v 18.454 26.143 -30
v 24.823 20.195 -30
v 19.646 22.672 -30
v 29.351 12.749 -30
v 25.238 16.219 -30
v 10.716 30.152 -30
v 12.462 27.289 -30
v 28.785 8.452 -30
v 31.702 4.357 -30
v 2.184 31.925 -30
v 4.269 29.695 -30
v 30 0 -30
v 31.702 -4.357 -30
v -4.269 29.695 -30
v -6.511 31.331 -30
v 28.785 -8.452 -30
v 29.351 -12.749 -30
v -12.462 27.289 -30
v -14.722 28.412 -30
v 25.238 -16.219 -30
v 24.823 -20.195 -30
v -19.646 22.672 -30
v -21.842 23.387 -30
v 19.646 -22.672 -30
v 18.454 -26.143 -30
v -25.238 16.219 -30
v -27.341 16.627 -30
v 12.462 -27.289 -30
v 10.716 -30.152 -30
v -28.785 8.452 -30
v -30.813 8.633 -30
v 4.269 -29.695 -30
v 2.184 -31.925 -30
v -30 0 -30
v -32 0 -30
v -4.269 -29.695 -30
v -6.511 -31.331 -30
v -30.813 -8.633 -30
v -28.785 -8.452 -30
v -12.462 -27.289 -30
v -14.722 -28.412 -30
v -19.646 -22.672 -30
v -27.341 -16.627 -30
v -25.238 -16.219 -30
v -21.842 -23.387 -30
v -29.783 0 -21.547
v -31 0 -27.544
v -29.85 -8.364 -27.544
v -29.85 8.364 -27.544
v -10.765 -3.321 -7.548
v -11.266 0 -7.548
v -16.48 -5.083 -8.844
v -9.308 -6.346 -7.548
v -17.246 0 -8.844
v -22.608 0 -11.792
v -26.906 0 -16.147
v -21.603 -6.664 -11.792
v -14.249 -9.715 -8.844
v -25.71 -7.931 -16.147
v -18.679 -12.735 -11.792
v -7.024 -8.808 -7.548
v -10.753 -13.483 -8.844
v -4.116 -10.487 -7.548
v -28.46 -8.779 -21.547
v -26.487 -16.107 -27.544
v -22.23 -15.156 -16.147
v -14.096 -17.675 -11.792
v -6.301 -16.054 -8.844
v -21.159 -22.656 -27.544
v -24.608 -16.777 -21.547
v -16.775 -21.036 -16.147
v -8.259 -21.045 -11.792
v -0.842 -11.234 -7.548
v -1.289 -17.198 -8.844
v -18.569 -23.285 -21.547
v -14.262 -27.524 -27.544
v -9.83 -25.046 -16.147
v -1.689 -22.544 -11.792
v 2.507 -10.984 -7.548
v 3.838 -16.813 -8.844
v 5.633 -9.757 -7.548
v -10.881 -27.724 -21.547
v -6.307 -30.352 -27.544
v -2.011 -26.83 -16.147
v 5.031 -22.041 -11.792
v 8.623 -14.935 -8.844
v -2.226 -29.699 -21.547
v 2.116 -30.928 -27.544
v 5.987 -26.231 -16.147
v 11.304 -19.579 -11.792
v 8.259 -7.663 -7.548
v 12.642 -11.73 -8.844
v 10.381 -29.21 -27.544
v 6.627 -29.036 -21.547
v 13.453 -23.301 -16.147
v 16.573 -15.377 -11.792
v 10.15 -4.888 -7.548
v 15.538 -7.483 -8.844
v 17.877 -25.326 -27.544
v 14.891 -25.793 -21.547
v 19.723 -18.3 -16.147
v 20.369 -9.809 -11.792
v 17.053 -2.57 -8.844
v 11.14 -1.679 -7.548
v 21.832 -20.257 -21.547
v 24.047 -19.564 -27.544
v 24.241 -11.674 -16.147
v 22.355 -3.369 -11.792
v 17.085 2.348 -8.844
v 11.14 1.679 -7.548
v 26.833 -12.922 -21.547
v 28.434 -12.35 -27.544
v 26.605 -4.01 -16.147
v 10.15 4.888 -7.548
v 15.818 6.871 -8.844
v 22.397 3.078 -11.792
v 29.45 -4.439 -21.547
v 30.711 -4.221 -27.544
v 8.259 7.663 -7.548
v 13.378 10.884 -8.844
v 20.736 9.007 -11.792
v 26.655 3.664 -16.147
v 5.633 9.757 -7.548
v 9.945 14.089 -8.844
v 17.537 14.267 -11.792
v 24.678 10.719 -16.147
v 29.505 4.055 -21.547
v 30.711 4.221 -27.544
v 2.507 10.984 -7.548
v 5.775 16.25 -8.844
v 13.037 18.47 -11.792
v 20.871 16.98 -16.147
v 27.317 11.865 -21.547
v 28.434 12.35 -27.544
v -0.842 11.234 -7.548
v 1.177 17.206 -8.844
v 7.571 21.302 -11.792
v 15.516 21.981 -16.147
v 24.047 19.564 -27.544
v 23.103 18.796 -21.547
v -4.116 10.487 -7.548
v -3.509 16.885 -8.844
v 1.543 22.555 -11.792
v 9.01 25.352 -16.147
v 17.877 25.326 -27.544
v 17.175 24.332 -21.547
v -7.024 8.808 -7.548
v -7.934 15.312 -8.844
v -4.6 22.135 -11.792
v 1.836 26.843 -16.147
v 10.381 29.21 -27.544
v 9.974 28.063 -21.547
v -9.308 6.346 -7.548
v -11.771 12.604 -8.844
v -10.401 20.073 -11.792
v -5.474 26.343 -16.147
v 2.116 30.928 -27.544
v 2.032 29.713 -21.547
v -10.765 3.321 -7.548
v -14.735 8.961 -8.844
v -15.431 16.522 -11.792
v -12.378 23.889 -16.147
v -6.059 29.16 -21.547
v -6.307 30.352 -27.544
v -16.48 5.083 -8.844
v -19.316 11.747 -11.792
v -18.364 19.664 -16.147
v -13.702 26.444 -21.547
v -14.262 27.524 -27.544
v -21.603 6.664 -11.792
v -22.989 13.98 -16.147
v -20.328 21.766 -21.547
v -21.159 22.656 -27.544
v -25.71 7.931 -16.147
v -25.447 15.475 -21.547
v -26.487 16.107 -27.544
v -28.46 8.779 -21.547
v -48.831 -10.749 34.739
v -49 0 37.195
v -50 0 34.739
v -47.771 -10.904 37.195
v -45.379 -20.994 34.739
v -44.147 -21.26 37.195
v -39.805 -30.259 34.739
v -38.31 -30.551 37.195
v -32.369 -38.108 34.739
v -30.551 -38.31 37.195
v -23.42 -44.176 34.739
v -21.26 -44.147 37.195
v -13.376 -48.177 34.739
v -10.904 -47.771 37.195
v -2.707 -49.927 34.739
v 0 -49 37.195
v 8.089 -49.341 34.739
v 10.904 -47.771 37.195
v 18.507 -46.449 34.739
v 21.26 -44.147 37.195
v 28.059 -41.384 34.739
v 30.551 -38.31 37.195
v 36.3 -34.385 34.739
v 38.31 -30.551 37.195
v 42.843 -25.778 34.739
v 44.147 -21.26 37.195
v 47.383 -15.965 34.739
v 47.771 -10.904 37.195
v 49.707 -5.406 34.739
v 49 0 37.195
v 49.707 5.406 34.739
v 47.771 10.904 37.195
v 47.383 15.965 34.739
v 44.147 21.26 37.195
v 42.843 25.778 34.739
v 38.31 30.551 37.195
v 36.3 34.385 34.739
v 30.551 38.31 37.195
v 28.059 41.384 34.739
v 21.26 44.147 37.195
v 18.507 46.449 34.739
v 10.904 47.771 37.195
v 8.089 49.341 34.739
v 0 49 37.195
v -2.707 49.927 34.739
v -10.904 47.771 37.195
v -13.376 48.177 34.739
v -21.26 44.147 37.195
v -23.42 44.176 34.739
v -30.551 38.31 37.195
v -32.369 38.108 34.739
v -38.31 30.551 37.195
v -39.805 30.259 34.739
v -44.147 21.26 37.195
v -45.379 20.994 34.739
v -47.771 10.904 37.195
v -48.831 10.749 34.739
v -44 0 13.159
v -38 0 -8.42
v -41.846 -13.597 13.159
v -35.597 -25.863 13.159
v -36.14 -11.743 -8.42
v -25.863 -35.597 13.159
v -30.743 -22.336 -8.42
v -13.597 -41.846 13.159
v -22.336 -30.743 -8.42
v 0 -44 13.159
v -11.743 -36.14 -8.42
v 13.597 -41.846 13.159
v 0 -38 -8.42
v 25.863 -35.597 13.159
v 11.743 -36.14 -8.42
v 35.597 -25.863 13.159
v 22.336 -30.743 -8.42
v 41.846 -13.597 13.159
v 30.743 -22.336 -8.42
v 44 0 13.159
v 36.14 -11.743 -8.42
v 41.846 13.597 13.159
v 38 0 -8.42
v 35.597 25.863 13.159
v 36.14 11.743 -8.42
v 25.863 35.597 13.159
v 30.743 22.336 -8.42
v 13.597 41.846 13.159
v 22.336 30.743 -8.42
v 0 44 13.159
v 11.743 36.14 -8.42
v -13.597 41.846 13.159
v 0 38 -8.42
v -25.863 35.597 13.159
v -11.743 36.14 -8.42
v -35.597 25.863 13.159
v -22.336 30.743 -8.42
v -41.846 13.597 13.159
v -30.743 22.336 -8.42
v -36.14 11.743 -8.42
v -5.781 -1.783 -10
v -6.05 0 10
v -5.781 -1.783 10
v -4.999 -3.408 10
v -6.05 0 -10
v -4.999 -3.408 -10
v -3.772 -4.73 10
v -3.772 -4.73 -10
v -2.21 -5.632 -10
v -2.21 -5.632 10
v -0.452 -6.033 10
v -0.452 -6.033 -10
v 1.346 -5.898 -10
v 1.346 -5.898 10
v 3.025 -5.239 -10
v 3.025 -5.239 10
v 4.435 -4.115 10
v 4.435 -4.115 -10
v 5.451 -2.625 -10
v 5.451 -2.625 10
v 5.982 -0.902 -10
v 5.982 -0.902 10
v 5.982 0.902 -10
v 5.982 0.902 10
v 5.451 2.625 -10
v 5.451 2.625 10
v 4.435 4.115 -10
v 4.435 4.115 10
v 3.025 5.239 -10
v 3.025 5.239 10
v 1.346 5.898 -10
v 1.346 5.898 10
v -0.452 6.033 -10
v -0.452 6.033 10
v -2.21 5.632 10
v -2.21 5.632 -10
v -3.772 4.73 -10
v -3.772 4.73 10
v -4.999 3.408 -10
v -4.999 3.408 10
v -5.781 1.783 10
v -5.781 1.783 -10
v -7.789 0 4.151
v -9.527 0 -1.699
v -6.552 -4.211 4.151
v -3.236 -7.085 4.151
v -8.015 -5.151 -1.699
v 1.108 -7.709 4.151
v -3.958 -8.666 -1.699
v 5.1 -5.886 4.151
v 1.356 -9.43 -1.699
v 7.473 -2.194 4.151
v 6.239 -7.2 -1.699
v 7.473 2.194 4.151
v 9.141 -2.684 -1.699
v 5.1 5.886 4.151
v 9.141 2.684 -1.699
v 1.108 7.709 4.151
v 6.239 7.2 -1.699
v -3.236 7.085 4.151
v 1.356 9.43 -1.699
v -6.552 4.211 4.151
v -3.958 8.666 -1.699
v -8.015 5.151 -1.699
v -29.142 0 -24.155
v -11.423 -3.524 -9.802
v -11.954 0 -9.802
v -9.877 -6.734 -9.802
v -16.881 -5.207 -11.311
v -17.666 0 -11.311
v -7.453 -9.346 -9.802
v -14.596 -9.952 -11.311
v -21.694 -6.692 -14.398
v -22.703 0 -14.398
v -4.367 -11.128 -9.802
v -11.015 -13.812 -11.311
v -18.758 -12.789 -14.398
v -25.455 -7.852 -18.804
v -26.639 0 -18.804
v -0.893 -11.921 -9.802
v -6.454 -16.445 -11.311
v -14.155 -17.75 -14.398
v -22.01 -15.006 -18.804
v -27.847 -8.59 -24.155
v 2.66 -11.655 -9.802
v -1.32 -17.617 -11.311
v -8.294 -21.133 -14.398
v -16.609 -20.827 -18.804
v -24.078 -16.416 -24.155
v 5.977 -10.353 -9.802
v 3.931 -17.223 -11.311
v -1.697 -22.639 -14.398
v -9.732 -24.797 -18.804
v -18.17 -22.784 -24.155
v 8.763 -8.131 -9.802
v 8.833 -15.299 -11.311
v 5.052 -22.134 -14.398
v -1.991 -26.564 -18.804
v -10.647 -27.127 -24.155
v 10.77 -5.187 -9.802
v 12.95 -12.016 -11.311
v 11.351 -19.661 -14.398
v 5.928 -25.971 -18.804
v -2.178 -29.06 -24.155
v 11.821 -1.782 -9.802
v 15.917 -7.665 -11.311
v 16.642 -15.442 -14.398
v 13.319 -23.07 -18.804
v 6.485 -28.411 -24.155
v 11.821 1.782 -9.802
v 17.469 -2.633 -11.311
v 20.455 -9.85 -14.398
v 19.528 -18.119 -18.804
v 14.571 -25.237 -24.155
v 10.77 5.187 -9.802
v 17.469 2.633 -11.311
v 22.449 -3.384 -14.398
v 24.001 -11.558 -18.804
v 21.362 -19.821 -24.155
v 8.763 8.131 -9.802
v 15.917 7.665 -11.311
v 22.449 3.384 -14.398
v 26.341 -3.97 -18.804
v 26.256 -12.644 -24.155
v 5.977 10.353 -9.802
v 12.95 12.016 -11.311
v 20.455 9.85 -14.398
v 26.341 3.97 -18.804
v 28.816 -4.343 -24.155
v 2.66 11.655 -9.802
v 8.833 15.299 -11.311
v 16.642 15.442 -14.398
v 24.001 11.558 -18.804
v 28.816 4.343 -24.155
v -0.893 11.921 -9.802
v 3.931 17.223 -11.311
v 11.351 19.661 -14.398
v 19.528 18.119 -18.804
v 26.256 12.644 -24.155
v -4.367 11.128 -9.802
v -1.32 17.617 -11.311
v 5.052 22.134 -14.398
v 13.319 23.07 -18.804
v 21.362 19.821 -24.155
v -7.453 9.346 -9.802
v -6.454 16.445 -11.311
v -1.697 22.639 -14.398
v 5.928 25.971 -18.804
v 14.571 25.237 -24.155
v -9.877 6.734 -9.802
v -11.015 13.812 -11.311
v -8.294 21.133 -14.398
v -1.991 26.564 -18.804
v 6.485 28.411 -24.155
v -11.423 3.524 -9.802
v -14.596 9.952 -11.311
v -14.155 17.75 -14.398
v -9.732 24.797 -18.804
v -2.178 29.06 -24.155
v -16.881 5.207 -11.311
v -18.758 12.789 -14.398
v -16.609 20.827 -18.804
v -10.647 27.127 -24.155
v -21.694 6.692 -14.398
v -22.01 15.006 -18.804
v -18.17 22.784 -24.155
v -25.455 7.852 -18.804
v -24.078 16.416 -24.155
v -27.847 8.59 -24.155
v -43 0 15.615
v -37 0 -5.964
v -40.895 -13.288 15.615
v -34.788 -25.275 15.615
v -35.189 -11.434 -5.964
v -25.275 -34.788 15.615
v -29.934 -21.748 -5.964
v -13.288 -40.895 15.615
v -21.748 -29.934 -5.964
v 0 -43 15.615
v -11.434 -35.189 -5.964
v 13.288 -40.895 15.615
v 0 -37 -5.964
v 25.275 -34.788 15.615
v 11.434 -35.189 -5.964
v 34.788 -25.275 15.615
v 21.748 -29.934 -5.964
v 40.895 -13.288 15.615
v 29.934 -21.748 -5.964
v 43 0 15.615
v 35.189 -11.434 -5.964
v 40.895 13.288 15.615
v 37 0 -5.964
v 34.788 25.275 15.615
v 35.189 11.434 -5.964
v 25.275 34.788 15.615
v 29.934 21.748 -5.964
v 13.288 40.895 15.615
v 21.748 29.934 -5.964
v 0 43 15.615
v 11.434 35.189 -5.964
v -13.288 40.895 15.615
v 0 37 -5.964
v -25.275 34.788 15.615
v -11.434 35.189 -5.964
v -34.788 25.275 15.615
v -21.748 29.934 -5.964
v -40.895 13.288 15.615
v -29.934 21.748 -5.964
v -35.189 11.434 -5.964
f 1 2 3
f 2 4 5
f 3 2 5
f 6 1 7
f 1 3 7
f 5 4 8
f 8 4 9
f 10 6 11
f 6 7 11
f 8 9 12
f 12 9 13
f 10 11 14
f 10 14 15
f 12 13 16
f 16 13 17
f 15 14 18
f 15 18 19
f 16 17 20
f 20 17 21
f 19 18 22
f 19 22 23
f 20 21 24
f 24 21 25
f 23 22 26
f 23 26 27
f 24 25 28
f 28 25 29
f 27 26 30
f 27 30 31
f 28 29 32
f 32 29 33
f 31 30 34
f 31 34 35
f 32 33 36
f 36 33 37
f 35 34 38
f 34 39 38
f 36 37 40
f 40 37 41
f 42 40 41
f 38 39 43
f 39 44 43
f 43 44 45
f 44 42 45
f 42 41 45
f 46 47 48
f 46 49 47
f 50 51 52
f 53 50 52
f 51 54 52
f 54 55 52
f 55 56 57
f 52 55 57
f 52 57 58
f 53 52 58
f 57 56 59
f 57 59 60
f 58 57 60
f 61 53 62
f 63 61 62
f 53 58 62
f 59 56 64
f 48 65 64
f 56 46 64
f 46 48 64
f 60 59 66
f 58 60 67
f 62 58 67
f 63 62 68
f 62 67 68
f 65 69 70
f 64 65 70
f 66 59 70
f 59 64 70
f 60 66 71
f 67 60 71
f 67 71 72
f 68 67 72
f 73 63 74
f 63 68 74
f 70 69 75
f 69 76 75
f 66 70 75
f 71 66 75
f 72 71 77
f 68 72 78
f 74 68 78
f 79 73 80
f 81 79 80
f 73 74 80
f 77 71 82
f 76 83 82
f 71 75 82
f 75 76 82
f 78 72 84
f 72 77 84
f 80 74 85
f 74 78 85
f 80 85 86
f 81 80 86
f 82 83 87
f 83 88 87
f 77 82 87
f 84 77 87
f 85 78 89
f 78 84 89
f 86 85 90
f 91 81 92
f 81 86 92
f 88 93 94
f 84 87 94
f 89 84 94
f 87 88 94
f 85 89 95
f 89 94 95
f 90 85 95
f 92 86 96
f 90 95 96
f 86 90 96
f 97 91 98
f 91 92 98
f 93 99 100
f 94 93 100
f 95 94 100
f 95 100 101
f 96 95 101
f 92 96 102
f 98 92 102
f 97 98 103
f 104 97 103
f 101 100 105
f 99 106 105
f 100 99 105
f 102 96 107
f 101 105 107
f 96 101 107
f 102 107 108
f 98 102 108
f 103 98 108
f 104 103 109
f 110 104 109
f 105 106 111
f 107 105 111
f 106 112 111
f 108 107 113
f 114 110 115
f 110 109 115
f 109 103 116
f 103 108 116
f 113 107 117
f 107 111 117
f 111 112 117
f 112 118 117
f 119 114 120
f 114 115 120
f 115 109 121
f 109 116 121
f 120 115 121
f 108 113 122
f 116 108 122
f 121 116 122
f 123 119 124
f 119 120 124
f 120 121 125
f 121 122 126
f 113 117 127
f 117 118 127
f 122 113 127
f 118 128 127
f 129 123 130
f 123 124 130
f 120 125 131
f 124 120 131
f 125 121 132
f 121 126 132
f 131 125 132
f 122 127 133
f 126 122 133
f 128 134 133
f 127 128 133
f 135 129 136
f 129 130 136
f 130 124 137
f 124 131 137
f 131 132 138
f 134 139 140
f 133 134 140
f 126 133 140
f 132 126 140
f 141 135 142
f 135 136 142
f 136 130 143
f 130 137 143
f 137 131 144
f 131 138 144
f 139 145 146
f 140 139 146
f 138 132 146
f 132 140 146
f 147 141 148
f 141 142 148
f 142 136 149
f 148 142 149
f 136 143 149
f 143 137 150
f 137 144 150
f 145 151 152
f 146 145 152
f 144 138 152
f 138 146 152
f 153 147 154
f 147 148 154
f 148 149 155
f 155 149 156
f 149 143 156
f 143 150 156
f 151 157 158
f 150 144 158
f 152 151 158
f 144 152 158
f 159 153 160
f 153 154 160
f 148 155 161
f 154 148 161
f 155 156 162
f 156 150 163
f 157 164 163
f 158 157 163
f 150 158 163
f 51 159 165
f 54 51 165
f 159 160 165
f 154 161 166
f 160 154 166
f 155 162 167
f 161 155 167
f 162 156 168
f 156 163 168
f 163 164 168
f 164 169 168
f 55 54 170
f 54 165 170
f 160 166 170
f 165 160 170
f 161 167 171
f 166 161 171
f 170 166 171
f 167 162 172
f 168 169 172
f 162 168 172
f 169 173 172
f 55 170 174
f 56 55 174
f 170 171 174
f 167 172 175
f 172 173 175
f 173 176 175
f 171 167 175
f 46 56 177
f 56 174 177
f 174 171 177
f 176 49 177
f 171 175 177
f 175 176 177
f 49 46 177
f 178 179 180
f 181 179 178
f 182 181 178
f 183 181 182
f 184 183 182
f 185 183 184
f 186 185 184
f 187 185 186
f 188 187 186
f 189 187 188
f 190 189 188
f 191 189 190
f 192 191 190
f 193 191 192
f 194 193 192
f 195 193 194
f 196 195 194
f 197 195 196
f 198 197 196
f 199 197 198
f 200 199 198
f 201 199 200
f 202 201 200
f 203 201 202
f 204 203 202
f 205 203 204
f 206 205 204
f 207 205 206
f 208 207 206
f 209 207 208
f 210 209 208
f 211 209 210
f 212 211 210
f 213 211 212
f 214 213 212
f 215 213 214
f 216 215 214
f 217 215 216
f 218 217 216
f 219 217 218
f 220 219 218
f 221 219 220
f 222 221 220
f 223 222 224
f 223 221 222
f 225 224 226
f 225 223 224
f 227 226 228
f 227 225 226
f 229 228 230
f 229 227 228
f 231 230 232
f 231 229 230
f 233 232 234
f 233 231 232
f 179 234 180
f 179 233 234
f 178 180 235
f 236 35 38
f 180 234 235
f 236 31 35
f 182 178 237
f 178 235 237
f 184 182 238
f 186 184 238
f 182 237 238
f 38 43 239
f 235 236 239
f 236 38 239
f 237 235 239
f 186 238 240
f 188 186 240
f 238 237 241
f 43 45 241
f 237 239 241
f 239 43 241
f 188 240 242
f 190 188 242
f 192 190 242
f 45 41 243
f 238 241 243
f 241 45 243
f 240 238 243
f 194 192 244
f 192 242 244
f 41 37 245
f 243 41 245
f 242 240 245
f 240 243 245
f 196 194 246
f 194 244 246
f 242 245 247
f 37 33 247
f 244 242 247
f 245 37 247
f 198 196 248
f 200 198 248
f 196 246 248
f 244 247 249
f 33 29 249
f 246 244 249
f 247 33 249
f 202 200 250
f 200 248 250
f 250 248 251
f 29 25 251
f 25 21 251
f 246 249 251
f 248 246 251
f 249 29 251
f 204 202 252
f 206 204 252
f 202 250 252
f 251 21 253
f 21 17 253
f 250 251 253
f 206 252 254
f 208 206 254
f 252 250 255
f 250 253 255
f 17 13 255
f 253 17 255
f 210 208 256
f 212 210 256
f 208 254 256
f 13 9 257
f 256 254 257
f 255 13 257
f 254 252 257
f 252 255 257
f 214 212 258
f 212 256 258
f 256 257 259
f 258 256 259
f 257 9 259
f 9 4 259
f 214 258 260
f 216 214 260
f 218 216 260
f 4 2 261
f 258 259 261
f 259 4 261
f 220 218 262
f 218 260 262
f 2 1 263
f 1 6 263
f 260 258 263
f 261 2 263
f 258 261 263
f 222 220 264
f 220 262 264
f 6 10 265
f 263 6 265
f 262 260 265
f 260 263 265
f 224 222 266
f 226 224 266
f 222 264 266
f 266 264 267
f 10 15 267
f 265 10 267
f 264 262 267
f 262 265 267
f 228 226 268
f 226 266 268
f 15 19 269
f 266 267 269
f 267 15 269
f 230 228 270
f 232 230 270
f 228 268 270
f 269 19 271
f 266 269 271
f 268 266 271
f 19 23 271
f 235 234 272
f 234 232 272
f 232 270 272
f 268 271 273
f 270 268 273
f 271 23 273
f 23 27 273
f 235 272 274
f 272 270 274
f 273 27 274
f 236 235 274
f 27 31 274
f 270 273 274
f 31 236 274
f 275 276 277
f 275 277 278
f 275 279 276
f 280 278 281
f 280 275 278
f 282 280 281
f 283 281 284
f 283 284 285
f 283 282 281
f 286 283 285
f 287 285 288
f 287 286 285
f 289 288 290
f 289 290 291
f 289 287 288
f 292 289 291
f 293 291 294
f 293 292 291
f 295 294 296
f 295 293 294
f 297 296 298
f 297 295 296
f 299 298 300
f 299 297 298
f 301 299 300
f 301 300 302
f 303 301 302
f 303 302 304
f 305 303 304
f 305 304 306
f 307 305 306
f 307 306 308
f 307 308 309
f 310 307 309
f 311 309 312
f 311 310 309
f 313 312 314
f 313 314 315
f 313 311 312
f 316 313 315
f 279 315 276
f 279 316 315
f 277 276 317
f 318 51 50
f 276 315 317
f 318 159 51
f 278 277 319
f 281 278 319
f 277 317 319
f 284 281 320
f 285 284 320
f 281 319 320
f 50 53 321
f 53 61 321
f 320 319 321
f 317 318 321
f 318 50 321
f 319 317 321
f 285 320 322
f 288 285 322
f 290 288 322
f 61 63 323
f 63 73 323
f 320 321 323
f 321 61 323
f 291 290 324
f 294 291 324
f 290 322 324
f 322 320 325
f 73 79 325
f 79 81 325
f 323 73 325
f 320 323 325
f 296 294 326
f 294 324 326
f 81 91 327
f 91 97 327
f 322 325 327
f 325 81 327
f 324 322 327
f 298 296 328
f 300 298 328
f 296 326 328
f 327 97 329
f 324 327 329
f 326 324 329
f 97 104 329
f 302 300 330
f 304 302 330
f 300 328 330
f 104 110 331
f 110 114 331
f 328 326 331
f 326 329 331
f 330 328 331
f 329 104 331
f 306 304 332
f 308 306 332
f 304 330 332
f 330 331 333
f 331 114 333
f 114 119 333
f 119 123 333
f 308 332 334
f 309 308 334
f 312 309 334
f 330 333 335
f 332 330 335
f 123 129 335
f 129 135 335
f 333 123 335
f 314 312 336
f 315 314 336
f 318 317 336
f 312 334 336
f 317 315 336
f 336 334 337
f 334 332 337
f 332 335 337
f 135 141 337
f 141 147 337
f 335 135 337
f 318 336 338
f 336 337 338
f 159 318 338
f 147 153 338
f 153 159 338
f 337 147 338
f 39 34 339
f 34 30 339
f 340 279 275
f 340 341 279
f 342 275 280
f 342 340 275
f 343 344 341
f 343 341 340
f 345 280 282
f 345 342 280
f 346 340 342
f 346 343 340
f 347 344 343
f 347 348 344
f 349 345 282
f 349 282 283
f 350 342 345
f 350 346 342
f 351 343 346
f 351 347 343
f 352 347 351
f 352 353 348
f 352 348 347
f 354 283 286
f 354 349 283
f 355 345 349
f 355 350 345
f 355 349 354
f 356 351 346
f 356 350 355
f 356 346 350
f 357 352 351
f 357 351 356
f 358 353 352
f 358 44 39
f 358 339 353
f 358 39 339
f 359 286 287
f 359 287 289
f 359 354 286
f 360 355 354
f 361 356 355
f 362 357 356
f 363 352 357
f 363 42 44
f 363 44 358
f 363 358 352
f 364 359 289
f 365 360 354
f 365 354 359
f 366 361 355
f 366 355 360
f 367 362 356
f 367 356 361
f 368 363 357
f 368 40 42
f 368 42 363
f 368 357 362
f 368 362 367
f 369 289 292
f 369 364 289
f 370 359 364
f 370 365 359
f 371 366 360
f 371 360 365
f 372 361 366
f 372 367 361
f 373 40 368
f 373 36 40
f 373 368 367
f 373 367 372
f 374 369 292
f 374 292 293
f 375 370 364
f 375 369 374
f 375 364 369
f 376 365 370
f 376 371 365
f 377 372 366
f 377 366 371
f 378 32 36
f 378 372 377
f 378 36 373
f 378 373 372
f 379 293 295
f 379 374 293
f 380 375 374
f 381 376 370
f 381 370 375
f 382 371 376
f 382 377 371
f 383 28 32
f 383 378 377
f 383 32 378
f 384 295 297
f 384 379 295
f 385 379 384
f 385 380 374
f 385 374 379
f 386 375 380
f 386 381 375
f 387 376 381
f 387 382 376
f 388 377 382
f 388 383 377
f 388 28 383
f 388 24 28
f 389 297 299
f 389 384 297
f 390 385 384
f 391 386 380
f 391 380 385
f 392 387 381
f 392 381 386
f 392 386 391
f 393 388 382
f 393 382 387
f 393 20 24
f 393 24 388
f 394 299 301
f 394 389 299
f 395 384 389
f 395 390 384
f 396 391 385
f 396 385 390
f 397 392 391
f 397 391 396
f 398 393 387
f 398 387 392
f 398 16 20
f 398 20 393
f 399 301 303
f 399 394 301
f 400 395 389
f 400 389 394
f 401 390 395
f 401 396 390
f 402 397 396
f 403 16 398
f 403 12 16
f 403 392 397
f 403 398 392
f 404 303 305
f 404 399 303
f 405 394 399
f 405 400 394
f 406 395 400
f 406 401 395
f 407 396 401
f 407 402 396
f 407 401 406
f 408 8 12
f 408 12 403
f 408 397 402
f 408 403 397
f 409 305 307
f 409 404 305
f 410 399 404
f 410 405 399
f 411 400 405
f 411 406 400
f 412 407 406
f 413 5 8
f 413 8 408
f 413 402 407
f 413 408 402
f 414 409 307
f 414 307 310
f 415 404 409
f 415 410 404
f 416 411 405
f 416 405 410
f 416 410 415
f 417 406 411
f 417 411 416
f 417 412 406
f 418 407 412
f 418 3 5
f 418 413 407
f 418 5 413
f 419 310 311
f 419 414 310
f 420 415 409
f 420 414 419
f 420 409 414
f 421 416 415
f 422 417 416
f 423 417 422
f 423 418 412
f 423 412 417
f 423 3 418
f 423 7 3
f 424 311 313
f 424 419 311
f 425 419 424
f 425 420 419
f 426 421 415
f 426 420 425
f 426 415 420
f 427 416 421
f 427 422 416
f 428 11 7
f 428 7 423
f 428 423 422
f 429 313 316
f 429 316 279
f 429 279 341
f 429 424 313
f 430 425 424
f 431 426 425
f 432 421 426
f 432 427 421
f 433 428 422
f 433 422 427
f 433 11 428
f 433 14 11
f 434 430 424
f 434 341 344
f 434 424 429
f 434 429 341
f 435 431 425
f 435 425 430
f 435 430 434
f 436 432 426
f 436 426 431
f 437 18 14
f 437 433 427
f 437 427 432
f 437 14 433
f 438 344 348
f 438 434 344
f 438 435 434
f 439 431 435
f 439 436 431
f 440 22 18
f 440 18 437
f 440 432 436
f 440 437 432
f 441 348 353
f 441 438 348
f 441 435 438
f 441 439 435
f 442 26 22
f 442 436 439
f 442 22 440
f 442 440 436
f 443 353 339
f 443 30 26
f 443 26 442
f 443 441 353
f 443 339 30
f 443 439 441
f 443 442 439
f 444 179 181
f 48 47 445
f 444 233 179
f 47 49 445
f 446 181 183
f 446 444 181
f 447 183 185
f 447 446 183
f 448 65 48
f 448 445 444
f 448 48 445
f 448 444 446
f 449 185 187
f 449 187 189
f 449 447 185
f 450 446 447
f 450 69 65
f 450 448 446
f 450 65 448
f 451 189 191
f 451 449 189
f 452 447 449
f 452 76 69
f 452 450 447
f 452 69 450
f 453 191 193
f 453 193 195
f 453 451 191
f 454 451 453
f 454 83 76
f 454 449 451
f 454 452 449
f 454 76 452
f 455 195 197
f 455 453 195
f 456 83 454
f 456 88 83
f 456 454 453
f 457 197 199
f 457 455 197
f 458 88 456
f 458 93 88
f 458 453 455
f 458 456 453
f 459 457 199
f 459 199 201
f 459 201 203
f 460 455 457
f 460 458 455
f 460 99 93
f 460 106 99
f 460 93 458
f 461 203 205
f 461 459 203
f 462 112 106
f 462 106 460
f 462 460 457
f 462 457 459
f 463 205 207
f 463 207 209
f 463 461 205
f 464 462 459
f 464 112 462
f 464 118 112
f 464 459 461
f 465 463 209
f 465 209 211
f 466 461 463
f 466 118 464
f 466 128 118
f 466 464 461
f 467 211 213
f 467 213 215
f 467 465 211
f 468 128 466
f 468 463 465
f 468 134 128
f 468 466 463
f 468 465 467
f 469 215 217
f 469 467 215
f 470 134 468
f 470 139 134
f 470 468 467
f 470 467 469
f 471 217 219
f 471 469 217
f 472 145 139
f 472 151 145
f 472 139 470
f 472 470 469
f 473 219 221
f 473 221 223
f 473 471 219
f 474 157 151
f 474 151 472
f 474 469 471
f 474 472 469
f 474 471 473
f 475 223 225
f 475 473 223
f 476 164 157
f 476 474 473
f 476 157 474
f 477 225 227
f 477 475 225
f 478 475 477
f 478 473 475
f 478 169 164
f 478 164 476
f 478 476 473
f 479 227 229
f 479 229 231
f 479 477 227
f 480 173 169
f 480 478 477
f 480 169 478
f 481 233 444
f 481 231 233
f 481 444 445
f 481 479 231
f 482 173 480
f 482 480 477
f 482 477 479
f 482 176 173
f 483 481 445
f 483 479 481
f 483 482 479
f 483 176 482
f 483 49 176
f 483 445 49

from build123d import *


with BuildPart() as part:
    # Sketch → Revolution (revolve)
    with BuildSketch(Plane.XZ):
        with BuildLine():
            Line((-50, 34.7391), (-32, -30))
            Line((-32, -30), (-30, -30))
            ThreePointArc((-6.05, -10), (-22.702813, -14.398319), (-30, -30))
            Line((-6.05, 10), (-6.05, -10))
            Line((-6.05, 10), (-11.265964, -7.547867))
            ThreePointArc((-11.265964, -7.547867), (-24.914311, -13.814151), (-31, -27.543976))
            Line((-49, 37.195124), (-31, -27.543976))
            Line((-50, 34.7391), (-49, 37.195124))
        make_face()
    revolve(axis=Axis((0, 0, 0), (0, 0, 1)))


solid = part.part
